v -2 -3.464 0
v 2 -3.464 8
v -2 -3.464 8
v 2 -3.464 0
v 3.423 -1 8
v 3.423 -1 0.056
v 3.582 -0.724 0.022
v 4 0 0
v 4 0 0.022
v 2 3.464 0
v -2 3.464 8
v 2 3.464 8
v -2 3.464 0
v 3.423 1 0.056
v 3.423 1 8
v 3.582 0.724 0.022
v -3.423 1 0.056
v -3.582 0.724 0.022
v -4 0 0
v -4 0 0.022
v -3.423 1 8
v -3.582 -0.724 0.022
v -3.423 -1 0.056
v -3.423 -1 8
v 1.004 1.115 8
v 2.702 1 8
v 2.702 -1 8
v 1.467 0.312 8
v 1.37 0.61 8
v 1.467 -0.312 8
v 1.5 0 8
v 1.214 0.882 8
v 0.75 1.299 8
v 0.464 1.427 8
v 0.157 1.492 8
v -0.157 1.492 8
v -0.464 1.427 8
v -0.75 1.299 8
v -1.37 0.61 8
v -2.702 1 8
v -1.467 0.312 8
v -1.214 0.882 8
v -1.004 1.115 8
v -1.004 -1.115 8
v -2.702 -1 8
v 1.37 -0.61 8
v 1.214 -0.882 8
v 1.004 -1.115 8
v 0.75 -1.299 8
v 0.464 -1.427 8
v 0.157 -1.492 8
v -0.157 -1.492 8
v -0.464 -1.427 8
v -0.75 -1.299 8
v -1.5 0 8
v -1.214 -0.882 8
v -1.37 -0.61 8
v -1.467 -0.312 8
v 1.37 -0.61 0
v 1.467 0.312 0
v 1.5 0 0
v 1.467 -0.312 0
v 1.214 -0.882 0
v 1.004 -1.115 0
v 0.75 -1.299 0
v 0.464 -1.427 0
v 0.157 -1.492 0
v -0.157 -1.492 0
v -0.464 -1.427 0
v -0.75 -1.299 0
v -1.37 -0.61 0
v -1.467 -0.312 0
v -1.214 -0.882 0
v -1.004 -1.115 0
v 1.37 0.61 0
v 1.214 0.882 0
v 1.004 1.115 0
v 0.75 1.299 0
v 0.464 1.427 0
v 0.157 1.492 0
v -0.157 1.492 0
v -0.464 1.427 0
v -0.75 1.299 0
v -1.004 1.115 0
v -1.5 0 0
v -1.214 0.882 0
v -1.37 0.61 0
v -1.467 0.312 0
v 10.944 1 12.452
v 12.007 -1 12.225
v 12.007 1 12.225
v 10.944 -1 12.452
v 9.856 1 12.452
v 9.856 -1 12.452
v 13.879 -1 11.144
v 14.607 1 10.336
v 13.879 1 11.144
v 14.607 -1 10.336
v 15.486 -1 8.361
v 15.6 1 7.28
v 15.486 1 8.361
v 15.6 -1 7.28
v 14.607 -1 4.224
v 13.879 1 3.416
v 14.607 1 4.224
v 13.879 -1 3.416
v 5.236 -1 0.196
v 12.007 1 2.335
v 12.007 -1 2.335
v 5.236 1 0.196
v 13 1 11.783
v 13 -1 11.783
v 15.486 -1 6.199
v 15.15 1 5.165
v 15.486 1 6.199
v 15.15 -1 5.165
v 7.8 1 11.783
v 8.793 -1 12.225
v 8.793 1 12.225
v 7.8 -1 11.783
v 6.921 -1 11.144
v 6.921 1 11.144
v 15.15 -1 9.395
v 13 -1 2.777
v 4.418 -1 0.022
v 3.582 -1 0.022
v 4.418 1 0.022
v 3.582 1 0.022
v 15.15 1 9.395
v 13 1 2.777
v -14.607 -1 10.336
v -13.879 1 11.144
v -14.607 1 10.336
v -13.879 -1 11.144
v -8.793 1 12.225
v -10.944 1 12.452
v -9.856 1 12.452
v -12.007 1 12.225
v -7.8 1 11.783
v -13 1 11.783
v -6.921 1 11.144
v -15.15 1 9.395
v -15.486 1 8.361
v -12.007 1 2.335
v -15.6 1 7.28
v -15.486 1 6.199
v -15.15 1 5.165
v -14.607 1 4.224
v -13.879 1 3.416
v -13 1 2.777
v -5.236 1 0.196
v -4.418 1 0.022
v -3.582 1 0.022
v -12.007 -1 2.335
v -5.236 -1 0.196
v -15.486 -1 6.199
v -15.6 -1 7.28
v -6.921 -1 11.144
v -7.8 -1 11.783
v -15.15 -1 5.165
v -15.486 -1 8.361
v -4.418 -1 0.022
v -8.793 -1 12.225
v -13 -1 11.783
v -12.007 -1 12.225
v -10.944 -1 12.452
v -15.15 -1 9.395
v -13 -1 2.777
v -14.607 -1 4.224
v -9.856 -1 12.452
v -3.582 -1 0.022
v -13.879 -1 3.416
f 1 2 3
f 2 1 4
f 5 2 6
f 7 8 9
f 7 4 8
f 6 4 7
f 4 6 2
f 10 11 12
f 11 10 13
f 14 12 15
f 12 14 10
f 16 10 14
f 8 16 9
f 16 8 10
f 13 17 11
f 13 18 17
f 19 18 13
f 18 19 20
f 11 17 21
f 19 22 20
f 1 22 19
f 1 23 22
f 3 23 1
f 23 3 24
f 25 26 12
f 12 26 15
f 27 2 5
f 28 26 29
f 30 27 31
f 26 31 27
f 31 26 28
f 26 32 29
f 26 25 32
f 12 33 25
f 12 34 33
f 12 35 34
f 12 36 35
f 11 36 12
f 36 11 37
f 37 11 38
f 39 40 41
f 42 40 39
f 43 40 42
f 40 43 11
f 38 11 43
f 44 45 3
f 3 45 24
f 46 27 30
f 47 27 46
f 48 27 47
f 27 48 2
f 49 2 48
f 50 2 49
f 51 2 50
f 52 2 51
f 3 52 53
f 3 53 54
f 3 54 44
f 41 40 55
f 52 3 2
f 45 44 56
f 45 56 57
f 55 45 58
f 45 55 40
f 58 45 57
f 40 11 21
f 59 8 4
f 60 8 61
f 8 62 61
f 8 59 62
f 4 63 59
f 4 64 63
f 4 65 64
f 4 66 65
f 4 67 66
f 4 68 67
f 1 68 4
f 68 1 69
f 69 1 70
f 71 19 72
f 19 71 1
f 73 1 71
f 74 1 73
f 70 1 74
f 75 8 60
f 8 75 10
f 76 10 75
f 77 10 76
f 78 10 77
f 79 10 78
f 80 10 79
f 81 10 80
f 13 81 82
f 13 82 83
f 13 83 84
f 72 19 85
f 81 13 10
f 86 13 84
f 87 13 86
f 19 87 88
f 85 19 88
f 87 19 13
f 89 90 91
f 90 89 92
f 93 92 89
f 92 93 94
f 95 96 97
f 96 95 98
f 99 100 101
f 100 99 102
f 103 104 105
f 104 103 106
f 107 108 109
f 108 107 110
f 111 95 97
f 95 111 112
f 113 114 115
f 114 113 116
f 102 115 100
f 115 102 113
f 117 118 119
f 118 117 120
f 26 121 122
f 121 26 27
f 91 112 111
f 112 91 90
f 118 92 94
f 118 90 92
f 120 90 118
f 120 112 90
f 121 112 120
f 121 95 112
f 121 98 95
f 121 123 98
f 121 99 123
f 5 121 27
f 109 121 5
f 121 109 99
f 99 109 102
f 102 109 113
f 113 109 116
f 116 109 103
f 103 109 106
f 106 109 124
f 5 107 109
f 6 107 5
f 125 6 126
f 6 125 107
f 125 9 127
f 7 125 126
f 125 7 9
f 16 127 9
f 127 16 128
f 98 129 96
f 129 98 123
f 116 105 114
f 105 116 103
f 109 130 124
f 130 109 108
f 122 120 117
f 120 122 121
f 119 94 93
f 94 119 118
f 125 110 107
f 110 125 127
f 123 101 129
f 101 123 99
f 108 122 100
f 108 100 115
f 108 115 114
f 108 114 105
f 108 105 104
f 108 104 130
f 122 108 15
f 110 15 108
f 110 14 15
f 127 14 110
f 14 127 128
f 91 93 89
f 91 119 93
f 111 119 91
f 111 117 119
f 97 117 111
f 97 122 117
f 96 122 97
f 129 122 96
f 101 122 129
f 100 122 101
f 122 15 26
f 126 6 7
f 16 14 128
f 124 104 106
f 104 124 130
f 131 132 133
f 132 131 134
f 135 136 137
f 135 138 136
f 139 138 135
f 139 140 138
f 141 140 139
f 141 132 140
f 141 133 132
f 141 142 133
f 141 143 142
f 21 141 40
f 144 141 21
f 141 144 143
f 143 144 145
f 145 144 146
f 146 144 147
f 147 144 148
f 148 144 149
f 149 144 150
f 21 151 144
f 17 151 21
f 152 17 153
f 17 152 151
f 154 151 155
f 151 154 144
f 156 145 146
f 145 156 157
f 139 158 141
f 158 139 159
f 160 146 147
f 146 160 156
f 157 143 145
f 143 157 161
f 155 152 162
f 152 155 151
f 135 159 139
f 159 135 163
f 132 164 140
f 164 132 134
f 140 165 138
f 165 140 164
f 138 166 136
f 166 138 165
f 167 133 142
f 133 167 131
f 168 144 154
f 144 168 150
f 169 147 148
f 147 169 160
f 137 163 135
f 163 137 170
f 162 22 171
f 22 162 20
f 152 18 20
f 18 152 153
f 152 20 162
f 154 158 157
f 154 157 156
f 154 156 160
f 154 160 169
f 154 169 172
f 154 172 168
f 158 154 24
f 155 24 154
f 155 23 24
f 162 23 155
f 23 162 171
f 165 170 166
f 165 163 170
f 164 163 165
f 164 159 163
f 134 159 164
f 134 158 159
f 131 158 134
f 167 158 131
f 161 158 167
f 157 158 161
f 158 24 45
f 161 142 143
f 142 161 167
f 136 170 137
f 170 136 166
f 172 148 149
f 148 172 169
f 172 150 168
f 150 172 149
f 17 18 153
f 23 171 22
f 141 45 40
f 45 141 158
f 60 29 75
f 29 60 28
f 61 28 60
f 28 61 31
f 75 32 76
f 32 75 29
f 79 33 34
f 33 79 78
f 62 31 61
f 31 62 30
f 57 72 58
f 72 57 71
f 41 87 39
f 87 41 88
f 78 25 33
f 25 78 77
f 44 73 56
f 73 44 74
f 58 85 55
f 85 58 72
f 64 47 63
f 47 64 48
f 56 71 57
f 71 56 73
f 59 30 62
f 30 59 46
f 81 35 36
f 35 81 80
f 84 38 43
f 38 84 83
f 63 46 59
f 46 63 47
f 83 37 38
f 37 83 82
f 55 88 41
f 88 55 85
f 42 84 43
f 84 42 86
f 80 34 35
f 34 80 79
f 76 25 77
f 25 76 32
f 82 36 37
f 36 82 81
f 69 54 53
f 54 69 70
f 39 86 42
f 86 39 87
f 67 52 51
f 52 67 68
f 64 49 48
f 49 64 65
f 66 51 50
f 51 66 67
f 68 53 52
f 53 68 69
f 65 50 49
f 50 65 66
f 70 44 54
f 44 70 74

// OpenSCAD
//
//  parametric wing nut
//  


major = 4.0; // [ 2.0, 2.5, 3.0, 4.0, 5.0, 6.0, 8.0, 10.0, 12.0 ]
minor = major*0.75; // 2.25 for M3, 3.0 for M4, 3.9 for M5, 4.6 for M6, 6.25 for 

have_wings = true; // [ true, false ]

d = 1*0.01;

nutheight = 2*major;
wingmaxr = major*1.3;
wingwall = major*0.5;

module wing() {
	if (have_wings) hull () {
		translate([nutheight/2,0,major]) rotate([90,0,0]) 
			translate([0,0,-wingwall/2]) cylinder(r = nutheight/2, h = wingwall, $fn=30);
		translate([wingmaxr*2.0,0,wingmaxr*1.4]) rotate([90,0,0]) 
			translate([0,0,-wingwall/2]) cylinder(r = wingmaxr, h = wingwall, $fn=30);
	}
}

difference () {
	union () {
		cylinder(r = major, h = nutheight, $fn=6);
		wing();
		rotate([0, 0, 180]) wing();
	}
	translate([0, 0, -d]) cylinder(r = minor/2, h = nutheight+2*d, $fn=30);
}
